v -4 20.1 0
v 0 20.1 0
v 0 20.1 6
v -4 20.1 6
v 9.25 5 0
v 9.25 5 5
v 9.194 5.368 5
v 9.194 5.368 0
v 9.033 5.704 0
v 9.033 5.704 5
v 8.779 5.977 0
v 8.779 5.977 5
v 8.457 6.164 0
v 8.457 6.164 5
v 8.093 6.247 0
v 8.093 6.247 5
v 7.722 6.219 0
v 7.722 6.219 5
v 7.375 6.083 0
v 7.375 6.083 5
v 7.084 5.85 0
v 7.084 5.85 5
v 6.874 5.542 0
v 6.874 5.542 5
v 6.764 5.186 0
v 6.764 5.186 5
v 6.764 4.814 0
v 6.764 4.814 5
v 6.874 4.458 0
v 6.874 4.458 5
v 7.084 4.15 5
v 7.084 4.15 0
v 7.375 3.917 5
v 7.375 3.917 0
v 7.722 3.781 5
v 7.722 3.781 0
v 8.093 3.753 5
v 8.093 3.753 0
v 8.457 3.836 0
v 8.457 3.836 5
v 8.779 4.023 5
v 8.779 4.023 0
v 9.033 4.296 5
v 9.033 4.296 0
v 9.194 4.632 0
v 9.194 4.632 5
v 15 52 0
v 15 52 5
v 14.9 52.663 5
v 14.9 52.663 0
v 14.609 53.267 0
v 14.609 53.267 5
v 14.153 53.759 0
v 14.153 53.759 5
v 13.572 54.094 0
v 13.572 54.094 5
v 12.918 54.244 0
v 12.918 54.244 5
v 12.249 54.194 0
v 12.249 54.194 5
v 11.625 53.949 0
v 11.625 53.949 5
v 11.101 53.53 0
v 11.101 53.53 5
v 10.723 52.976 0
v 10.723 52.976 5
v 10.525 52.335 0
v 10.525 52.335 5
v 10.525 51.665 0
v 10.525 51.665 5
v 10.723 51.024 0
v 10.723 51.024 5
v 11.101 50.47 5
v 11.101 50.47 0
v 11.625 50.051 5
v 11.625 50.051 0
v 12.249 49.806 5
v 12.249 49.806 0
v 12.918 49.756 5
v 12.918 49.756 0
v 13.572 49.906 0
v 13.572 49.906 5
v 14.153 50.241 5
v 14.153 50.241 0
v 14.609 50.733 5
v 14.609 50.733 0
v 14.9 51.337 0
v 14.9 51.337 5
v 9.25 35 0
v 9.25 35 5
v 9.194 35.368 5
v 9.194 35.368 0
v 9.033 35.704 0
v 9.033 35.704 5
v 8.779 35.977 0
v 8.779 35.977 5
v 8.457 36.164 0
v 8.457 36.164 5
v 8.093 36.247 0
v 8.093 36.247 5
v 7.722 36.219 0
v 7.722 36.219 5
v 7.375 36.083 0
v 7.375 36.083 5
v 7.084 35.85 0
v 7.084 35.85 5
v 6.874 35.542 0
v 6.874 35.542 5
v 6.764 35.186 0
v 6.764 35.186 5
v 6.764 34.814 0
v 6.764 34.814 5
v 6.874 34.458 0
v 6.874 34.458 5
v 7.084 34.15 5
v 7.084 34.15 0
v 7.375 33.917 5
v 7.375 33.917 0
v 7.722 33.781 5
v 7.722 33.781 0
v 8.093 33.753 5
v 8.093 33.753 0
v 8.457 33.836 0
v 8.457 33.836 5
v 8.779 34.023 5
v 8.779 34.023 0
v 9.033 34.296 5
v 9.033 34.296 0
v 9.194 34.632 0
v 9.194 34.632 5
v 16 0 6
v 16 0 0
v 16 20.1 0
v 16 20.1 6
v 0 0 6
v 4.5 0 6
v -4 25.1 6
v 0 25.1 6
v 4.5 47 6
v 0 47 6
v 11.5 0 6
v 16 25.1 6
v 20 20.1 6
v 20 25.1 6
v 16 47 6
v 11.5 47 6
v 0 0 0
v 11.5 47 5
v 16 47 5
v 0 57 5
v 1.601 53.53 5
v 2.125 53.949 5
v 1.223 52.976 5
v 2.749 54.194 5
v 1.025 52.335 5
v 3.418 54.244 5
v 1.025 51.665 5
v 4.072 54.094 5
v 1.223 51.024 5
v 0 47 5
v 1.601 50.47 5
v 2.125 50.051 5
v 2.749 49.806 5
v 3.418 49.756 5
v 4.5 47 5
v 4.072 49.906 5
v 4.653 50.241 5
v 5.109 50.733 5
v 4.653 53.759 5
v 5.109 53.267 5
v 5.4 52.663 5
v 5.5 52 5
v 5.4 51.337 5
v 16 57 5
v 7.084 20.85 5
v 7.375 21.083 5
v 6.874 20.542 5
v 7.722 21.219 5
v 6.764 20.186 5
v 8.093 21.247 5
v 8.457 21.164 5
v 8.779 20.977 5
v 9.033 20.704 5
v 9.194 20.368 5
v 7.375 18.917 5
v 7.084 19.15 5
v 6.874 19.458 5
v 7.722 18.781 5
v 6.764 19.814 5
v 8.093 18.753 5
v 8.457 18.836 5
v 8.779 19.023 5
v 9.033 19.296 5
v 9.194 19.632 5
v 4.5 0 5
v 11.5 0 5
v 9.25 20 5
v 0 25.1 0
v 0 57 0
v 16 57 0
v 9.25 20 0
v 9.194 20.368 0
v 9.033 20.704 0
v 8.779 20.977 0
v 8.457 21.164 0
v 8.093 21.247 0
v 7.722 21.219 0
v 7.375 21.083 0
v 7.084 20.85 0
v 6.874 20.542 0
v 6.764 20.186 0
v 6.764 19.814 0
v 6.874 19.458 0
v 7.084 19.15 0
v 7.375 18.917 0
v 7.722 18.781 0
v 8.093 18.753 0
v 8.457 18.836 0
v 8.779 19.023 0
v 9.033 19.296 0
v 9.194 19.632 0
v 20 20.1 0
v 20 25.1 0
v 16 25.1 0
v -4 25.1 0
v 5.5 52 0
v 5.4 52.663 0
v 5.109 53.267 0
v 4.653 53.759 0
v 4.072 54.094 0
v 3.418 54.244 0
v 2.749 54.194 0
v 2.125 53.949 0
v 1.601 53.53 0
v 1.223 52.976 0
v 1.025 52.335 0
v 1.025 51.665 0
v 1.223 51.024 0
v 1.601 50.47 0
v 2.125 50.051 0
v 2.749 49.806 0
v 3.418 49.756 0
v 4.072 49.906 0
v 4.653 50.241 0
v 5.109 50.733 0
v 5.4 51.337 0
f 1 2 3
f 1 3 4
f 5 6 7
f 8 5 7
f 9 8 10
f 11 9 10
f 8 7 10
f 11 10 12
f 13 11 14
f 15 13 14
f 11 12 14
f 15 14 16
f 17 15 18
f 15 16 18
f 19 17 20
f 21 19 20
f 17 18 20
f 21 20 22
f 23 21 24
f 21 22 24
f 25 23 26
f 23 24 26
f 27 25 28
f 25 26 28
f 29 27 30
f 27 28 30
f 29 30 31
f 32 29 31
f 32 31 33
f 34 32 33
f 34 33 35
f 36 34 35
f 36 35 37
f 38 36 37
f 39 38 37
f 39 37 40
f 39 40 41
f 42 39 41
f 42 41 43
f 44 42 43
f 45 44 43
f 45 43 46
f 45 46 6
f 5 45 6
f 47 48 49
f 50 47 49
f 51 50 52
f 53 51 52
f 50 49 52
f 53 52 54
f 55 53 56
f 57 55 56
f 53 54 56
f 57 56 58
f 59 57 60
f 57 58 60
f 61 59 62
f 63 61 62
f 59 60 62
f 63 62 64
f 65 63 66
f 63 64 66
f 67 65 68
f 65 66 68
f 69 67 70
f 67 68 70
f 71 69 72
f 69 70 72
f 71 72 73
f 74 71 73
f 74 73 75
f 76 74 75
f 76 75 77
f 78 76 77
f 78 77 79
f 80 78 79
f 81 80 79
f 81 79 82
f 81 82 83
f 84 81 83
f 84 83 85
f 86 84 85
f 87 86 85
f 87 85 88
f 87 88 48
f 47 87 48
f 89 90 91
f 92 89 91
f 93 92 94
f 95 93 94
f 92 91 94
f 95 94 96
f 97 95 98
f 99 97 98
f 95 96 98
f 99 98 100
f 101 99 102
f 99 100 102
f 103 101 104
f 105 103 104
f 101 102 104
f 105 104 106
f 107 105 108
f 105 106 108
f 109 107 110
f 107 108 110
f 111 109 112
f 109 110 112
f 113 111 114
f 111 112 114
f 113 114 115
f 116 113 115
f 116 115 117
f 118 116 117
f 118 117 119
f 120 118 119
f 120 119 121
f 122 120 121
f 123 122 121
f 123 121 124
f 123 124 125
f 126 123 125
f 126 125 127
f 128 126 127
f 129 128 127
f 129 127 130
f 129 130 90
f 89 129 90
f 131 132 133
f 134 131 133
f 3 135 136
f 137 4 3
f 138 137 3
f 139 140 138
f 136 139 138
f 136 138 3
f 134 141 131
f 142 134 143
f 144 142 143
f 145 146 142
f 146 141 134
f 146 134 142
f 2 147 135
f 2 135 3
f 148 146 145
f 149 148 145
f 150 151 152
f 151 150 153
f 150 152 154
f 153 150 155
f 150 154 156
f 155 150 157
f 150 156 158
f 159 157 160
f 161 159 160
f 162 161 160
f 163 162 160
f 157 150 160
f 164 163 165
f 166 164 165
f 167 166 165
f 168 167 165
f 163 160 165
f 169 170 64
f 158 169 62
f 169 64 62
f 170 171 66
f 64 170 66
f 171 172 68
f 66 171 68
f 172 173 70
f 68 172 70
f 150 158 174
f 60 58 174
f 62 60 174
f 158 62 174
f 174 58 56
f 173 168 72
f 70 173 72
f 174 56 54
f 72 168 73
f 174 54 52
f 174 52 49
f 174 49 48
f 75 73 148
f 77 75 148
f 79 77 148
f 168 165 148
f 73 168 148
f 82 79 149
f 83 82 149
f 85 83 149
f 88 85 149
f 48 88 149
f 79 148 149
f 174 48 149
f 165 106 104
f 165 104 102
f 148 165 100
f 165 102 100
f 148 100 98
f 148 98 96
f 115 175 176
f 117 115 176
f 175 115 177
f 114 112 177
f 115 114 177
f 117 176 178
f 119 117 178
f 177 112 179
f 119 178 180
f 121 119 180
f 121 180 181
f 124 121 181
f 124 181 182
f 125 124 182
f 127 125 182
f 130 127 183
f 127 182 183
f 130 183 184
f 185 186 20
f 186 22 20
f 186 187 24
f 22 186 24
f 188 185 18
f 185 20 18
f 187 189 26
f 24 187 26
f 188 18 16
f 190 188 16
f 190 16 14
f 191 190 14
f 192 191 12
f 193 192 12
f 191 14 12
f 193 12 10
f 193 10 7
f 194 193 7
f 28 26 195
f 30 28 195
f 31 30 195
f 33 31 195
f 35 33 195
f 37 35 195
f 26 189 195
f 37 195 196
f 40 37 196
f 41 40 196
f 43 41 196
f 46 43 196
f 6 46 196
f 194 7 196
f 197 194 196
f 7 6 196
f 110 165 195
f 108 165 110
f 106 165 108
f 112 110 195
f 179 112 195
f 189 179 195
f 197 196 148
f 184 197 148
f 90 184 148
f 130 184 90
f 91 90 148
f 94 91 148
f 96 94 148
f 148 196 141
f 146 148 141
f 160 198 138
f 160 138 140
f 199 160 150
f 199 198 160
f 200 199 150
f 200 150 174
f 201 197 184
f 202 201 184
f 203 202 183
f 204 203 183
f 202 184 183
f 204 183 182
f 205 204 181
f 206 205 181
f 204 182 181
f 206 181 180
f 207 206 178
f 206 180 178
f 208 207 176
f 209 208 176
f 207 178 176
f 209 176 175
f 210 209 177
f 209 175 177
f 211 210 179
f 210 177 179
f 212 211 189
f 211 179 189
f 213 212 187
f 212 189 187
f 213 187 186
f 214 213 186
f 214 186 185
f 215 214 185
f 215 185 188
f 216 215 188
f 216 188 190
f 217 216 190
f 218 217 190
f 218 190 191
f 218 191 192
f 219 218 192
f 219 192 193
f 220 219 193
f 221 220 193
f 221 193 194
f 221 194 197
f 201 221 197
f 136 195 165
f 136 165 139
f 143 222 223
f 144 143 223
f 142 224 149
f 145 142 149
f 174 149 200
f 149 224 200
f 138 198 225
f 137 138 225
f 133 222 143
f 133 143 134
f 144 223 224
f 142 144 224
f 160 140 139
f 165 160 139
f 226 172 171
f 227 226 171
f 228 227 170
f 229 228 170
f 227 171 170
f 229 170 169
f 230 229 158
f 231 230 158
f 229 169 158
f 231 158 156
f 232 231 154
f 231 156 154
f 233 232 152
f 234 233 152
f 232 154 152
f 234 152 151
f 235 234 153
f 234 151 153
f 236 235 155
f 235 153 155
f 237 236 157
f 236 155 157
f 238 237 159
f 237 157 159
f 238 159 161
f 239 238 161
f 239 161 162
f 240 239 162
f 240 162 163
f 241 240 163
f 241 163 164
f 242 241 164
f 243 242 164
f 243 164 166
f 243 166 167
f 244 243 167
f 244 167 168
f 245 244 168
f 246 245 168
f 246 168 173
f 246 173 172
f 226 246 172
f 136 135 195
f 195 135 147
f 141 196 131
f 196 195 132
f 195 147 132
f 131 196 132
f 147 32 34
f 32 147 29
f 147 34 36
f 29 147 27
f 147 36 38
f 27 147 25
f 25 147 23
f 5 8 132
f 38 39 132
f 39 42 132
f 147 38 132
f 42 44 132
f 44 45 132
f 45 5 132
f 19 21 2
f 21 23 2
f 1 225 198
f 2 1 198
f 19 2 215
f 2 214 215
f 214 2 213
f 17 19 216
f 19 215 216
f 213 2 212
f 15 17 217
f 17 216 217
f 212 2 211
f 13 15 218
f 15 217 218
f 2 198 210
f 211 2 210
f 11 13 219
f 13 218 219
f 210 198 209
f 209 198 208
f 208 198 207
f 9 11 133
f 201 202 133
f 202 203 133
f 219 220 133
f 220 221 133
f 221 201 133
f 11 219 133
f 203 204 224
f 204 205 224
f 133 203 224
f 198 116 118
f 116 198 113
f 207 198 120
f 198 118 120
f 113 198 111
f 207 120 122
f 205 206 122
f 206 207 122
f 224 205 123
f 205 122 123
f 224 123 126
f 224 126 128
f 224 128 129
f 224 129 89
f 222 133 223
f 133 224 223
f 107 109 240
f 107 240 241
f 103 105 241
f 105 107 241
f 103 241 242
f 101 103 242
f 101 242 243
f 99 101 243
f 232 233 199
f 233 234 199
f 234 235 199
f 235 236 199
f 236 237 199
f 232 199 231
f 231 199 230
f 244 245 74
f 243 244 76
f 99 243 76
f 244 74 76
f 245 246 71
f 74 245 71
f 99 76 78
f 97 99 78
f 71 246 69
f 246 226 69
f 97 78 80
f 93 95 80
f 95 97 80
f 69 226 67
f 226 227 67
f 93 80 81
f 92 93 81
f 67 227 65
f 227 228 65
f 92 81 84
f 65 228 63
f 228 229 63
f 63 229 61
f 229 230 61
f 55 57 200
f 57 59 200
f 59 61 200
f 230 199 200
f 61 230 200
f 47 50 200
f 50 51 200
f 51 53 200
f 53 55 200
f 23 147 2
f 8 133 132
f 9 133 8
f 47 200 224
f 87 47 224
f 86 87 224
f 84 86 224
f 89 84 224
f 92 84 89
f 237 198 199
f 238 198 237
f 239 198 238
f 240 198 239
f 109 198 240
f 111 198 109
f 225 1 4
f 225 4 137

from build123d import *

# Parameters (mm, degrees)
SKETCH_1_W             = 16
SKETCH_1_H             = 57
EXTRUDE_1_DEPTH        = 6
SKETCH_2_W             = 31.720899854
SKETCH_2_H             = 10
CUT_EXTRUDE_1_DEPTH    = 1
SKETCH_3_W             = 4
SKETCH_3_H             = 5
EXTRUDE_2_DEPTH        = 6
HOLE_WIZARD_M3_1_D     = 2.5
HOLE_WIZARD_M3_1_DEPTH = 7.5
HOLE_WIZARD_M3_1_TIP   = 0.751075774
SKETCH_6_W             = 7
SKETCH_6_H             = 1
CUT_EXTRUDE_2_DEPTH    = 58
SKETCH_7_R             = 2.25
CUT_EXTRUDE_3_DEPTH    = 6


with BuildPart() as part:
    # 草图1 → 凸台-拉伸1 (new body)
    with BuildSketch(Plane.XY):
        with Locations((8, 28.5)):
            Rectangle(SKETCH_1_W, SKETCH_1_H)
    extrude(amount=EXTRUDE_1_DEPTH)

    # 草图2 → 切除-拉伸1 (cut)
    with BuildSketch(Plane.XY.offset(6)):
        with Locations((15.860449927, 52)):
            Rectangle(SKETCH_2_W, SKETCH_2_H)
    extrude(amount=-CUT_EXTRUDE_1_DEPTH, mode=Mode.SUBTRACT)

    # 草图3 → 凸台-拉伸2 (add)
    with BuildSketch(Plane(origin=(0, 0, 0), x_dir=(-1, 0, 0), z_dir=(0, 0, -1))):
        with Locations((-18, 22.6)):
            Rectangle(SKETCH_3_W, SKETCH_3_H)
        with Locations((2, 22.6)):
            Rectangle(SKETCH_3_W, SKETCH_3_H)
    extrude(amount=-EXTRUDE_2_DEPTH)

    # M3 螺纹孔1
    with Locations(Plane(origin=(0, 0, 0), x_dir=(-1, 0, 0), z_dir=(0, 0, -1))):
        with Locations((-8, 35), (-8, 20), (-8, 5)):
            Hole(HOLE_WIZARD_M3_1_D / 2, depth=HOLE_WIZARD_M3_1_DEPTH)
            with Locations((0, 0, -(HOLE_WIZARD_M3_1_DEPTH + HOLE_WIZARD_M3_1_TIP / 2))):  # 118° drill point
                Cone(0, HOLE_WIZARD_M3_1_D / 2, HOLE_WIZARD_M3_1_TIP, mode=Mode.SUBTRACT)

    # 草图6 → 切除-拉伸2 (cut, through all)
    with BuildSketch(Plane.XZ):
        with Locations((8, 5.5)):
            Rectangle(SKETCH_6_W, SKETCH_6_H)
    extrude(amount=-CUT_EXTRUDE_2_DEPTH, mode=Mode.SUBTRACT)

    # 草图7 → 切除-拉伸3 (cut, through all)
    with BuildSketch(Plane.XY.offset(5)):
        with Locations((3.25, 52)):
            Circle(SKETCH_7_R)
        with Locations((12.75, 52)):
            Circle(SKETCH_7_R)
    extrude(amount=-CUT_EXTRUDE_3_DEPTH, mode=Mode.SUBTRACT)


solid = part.part
